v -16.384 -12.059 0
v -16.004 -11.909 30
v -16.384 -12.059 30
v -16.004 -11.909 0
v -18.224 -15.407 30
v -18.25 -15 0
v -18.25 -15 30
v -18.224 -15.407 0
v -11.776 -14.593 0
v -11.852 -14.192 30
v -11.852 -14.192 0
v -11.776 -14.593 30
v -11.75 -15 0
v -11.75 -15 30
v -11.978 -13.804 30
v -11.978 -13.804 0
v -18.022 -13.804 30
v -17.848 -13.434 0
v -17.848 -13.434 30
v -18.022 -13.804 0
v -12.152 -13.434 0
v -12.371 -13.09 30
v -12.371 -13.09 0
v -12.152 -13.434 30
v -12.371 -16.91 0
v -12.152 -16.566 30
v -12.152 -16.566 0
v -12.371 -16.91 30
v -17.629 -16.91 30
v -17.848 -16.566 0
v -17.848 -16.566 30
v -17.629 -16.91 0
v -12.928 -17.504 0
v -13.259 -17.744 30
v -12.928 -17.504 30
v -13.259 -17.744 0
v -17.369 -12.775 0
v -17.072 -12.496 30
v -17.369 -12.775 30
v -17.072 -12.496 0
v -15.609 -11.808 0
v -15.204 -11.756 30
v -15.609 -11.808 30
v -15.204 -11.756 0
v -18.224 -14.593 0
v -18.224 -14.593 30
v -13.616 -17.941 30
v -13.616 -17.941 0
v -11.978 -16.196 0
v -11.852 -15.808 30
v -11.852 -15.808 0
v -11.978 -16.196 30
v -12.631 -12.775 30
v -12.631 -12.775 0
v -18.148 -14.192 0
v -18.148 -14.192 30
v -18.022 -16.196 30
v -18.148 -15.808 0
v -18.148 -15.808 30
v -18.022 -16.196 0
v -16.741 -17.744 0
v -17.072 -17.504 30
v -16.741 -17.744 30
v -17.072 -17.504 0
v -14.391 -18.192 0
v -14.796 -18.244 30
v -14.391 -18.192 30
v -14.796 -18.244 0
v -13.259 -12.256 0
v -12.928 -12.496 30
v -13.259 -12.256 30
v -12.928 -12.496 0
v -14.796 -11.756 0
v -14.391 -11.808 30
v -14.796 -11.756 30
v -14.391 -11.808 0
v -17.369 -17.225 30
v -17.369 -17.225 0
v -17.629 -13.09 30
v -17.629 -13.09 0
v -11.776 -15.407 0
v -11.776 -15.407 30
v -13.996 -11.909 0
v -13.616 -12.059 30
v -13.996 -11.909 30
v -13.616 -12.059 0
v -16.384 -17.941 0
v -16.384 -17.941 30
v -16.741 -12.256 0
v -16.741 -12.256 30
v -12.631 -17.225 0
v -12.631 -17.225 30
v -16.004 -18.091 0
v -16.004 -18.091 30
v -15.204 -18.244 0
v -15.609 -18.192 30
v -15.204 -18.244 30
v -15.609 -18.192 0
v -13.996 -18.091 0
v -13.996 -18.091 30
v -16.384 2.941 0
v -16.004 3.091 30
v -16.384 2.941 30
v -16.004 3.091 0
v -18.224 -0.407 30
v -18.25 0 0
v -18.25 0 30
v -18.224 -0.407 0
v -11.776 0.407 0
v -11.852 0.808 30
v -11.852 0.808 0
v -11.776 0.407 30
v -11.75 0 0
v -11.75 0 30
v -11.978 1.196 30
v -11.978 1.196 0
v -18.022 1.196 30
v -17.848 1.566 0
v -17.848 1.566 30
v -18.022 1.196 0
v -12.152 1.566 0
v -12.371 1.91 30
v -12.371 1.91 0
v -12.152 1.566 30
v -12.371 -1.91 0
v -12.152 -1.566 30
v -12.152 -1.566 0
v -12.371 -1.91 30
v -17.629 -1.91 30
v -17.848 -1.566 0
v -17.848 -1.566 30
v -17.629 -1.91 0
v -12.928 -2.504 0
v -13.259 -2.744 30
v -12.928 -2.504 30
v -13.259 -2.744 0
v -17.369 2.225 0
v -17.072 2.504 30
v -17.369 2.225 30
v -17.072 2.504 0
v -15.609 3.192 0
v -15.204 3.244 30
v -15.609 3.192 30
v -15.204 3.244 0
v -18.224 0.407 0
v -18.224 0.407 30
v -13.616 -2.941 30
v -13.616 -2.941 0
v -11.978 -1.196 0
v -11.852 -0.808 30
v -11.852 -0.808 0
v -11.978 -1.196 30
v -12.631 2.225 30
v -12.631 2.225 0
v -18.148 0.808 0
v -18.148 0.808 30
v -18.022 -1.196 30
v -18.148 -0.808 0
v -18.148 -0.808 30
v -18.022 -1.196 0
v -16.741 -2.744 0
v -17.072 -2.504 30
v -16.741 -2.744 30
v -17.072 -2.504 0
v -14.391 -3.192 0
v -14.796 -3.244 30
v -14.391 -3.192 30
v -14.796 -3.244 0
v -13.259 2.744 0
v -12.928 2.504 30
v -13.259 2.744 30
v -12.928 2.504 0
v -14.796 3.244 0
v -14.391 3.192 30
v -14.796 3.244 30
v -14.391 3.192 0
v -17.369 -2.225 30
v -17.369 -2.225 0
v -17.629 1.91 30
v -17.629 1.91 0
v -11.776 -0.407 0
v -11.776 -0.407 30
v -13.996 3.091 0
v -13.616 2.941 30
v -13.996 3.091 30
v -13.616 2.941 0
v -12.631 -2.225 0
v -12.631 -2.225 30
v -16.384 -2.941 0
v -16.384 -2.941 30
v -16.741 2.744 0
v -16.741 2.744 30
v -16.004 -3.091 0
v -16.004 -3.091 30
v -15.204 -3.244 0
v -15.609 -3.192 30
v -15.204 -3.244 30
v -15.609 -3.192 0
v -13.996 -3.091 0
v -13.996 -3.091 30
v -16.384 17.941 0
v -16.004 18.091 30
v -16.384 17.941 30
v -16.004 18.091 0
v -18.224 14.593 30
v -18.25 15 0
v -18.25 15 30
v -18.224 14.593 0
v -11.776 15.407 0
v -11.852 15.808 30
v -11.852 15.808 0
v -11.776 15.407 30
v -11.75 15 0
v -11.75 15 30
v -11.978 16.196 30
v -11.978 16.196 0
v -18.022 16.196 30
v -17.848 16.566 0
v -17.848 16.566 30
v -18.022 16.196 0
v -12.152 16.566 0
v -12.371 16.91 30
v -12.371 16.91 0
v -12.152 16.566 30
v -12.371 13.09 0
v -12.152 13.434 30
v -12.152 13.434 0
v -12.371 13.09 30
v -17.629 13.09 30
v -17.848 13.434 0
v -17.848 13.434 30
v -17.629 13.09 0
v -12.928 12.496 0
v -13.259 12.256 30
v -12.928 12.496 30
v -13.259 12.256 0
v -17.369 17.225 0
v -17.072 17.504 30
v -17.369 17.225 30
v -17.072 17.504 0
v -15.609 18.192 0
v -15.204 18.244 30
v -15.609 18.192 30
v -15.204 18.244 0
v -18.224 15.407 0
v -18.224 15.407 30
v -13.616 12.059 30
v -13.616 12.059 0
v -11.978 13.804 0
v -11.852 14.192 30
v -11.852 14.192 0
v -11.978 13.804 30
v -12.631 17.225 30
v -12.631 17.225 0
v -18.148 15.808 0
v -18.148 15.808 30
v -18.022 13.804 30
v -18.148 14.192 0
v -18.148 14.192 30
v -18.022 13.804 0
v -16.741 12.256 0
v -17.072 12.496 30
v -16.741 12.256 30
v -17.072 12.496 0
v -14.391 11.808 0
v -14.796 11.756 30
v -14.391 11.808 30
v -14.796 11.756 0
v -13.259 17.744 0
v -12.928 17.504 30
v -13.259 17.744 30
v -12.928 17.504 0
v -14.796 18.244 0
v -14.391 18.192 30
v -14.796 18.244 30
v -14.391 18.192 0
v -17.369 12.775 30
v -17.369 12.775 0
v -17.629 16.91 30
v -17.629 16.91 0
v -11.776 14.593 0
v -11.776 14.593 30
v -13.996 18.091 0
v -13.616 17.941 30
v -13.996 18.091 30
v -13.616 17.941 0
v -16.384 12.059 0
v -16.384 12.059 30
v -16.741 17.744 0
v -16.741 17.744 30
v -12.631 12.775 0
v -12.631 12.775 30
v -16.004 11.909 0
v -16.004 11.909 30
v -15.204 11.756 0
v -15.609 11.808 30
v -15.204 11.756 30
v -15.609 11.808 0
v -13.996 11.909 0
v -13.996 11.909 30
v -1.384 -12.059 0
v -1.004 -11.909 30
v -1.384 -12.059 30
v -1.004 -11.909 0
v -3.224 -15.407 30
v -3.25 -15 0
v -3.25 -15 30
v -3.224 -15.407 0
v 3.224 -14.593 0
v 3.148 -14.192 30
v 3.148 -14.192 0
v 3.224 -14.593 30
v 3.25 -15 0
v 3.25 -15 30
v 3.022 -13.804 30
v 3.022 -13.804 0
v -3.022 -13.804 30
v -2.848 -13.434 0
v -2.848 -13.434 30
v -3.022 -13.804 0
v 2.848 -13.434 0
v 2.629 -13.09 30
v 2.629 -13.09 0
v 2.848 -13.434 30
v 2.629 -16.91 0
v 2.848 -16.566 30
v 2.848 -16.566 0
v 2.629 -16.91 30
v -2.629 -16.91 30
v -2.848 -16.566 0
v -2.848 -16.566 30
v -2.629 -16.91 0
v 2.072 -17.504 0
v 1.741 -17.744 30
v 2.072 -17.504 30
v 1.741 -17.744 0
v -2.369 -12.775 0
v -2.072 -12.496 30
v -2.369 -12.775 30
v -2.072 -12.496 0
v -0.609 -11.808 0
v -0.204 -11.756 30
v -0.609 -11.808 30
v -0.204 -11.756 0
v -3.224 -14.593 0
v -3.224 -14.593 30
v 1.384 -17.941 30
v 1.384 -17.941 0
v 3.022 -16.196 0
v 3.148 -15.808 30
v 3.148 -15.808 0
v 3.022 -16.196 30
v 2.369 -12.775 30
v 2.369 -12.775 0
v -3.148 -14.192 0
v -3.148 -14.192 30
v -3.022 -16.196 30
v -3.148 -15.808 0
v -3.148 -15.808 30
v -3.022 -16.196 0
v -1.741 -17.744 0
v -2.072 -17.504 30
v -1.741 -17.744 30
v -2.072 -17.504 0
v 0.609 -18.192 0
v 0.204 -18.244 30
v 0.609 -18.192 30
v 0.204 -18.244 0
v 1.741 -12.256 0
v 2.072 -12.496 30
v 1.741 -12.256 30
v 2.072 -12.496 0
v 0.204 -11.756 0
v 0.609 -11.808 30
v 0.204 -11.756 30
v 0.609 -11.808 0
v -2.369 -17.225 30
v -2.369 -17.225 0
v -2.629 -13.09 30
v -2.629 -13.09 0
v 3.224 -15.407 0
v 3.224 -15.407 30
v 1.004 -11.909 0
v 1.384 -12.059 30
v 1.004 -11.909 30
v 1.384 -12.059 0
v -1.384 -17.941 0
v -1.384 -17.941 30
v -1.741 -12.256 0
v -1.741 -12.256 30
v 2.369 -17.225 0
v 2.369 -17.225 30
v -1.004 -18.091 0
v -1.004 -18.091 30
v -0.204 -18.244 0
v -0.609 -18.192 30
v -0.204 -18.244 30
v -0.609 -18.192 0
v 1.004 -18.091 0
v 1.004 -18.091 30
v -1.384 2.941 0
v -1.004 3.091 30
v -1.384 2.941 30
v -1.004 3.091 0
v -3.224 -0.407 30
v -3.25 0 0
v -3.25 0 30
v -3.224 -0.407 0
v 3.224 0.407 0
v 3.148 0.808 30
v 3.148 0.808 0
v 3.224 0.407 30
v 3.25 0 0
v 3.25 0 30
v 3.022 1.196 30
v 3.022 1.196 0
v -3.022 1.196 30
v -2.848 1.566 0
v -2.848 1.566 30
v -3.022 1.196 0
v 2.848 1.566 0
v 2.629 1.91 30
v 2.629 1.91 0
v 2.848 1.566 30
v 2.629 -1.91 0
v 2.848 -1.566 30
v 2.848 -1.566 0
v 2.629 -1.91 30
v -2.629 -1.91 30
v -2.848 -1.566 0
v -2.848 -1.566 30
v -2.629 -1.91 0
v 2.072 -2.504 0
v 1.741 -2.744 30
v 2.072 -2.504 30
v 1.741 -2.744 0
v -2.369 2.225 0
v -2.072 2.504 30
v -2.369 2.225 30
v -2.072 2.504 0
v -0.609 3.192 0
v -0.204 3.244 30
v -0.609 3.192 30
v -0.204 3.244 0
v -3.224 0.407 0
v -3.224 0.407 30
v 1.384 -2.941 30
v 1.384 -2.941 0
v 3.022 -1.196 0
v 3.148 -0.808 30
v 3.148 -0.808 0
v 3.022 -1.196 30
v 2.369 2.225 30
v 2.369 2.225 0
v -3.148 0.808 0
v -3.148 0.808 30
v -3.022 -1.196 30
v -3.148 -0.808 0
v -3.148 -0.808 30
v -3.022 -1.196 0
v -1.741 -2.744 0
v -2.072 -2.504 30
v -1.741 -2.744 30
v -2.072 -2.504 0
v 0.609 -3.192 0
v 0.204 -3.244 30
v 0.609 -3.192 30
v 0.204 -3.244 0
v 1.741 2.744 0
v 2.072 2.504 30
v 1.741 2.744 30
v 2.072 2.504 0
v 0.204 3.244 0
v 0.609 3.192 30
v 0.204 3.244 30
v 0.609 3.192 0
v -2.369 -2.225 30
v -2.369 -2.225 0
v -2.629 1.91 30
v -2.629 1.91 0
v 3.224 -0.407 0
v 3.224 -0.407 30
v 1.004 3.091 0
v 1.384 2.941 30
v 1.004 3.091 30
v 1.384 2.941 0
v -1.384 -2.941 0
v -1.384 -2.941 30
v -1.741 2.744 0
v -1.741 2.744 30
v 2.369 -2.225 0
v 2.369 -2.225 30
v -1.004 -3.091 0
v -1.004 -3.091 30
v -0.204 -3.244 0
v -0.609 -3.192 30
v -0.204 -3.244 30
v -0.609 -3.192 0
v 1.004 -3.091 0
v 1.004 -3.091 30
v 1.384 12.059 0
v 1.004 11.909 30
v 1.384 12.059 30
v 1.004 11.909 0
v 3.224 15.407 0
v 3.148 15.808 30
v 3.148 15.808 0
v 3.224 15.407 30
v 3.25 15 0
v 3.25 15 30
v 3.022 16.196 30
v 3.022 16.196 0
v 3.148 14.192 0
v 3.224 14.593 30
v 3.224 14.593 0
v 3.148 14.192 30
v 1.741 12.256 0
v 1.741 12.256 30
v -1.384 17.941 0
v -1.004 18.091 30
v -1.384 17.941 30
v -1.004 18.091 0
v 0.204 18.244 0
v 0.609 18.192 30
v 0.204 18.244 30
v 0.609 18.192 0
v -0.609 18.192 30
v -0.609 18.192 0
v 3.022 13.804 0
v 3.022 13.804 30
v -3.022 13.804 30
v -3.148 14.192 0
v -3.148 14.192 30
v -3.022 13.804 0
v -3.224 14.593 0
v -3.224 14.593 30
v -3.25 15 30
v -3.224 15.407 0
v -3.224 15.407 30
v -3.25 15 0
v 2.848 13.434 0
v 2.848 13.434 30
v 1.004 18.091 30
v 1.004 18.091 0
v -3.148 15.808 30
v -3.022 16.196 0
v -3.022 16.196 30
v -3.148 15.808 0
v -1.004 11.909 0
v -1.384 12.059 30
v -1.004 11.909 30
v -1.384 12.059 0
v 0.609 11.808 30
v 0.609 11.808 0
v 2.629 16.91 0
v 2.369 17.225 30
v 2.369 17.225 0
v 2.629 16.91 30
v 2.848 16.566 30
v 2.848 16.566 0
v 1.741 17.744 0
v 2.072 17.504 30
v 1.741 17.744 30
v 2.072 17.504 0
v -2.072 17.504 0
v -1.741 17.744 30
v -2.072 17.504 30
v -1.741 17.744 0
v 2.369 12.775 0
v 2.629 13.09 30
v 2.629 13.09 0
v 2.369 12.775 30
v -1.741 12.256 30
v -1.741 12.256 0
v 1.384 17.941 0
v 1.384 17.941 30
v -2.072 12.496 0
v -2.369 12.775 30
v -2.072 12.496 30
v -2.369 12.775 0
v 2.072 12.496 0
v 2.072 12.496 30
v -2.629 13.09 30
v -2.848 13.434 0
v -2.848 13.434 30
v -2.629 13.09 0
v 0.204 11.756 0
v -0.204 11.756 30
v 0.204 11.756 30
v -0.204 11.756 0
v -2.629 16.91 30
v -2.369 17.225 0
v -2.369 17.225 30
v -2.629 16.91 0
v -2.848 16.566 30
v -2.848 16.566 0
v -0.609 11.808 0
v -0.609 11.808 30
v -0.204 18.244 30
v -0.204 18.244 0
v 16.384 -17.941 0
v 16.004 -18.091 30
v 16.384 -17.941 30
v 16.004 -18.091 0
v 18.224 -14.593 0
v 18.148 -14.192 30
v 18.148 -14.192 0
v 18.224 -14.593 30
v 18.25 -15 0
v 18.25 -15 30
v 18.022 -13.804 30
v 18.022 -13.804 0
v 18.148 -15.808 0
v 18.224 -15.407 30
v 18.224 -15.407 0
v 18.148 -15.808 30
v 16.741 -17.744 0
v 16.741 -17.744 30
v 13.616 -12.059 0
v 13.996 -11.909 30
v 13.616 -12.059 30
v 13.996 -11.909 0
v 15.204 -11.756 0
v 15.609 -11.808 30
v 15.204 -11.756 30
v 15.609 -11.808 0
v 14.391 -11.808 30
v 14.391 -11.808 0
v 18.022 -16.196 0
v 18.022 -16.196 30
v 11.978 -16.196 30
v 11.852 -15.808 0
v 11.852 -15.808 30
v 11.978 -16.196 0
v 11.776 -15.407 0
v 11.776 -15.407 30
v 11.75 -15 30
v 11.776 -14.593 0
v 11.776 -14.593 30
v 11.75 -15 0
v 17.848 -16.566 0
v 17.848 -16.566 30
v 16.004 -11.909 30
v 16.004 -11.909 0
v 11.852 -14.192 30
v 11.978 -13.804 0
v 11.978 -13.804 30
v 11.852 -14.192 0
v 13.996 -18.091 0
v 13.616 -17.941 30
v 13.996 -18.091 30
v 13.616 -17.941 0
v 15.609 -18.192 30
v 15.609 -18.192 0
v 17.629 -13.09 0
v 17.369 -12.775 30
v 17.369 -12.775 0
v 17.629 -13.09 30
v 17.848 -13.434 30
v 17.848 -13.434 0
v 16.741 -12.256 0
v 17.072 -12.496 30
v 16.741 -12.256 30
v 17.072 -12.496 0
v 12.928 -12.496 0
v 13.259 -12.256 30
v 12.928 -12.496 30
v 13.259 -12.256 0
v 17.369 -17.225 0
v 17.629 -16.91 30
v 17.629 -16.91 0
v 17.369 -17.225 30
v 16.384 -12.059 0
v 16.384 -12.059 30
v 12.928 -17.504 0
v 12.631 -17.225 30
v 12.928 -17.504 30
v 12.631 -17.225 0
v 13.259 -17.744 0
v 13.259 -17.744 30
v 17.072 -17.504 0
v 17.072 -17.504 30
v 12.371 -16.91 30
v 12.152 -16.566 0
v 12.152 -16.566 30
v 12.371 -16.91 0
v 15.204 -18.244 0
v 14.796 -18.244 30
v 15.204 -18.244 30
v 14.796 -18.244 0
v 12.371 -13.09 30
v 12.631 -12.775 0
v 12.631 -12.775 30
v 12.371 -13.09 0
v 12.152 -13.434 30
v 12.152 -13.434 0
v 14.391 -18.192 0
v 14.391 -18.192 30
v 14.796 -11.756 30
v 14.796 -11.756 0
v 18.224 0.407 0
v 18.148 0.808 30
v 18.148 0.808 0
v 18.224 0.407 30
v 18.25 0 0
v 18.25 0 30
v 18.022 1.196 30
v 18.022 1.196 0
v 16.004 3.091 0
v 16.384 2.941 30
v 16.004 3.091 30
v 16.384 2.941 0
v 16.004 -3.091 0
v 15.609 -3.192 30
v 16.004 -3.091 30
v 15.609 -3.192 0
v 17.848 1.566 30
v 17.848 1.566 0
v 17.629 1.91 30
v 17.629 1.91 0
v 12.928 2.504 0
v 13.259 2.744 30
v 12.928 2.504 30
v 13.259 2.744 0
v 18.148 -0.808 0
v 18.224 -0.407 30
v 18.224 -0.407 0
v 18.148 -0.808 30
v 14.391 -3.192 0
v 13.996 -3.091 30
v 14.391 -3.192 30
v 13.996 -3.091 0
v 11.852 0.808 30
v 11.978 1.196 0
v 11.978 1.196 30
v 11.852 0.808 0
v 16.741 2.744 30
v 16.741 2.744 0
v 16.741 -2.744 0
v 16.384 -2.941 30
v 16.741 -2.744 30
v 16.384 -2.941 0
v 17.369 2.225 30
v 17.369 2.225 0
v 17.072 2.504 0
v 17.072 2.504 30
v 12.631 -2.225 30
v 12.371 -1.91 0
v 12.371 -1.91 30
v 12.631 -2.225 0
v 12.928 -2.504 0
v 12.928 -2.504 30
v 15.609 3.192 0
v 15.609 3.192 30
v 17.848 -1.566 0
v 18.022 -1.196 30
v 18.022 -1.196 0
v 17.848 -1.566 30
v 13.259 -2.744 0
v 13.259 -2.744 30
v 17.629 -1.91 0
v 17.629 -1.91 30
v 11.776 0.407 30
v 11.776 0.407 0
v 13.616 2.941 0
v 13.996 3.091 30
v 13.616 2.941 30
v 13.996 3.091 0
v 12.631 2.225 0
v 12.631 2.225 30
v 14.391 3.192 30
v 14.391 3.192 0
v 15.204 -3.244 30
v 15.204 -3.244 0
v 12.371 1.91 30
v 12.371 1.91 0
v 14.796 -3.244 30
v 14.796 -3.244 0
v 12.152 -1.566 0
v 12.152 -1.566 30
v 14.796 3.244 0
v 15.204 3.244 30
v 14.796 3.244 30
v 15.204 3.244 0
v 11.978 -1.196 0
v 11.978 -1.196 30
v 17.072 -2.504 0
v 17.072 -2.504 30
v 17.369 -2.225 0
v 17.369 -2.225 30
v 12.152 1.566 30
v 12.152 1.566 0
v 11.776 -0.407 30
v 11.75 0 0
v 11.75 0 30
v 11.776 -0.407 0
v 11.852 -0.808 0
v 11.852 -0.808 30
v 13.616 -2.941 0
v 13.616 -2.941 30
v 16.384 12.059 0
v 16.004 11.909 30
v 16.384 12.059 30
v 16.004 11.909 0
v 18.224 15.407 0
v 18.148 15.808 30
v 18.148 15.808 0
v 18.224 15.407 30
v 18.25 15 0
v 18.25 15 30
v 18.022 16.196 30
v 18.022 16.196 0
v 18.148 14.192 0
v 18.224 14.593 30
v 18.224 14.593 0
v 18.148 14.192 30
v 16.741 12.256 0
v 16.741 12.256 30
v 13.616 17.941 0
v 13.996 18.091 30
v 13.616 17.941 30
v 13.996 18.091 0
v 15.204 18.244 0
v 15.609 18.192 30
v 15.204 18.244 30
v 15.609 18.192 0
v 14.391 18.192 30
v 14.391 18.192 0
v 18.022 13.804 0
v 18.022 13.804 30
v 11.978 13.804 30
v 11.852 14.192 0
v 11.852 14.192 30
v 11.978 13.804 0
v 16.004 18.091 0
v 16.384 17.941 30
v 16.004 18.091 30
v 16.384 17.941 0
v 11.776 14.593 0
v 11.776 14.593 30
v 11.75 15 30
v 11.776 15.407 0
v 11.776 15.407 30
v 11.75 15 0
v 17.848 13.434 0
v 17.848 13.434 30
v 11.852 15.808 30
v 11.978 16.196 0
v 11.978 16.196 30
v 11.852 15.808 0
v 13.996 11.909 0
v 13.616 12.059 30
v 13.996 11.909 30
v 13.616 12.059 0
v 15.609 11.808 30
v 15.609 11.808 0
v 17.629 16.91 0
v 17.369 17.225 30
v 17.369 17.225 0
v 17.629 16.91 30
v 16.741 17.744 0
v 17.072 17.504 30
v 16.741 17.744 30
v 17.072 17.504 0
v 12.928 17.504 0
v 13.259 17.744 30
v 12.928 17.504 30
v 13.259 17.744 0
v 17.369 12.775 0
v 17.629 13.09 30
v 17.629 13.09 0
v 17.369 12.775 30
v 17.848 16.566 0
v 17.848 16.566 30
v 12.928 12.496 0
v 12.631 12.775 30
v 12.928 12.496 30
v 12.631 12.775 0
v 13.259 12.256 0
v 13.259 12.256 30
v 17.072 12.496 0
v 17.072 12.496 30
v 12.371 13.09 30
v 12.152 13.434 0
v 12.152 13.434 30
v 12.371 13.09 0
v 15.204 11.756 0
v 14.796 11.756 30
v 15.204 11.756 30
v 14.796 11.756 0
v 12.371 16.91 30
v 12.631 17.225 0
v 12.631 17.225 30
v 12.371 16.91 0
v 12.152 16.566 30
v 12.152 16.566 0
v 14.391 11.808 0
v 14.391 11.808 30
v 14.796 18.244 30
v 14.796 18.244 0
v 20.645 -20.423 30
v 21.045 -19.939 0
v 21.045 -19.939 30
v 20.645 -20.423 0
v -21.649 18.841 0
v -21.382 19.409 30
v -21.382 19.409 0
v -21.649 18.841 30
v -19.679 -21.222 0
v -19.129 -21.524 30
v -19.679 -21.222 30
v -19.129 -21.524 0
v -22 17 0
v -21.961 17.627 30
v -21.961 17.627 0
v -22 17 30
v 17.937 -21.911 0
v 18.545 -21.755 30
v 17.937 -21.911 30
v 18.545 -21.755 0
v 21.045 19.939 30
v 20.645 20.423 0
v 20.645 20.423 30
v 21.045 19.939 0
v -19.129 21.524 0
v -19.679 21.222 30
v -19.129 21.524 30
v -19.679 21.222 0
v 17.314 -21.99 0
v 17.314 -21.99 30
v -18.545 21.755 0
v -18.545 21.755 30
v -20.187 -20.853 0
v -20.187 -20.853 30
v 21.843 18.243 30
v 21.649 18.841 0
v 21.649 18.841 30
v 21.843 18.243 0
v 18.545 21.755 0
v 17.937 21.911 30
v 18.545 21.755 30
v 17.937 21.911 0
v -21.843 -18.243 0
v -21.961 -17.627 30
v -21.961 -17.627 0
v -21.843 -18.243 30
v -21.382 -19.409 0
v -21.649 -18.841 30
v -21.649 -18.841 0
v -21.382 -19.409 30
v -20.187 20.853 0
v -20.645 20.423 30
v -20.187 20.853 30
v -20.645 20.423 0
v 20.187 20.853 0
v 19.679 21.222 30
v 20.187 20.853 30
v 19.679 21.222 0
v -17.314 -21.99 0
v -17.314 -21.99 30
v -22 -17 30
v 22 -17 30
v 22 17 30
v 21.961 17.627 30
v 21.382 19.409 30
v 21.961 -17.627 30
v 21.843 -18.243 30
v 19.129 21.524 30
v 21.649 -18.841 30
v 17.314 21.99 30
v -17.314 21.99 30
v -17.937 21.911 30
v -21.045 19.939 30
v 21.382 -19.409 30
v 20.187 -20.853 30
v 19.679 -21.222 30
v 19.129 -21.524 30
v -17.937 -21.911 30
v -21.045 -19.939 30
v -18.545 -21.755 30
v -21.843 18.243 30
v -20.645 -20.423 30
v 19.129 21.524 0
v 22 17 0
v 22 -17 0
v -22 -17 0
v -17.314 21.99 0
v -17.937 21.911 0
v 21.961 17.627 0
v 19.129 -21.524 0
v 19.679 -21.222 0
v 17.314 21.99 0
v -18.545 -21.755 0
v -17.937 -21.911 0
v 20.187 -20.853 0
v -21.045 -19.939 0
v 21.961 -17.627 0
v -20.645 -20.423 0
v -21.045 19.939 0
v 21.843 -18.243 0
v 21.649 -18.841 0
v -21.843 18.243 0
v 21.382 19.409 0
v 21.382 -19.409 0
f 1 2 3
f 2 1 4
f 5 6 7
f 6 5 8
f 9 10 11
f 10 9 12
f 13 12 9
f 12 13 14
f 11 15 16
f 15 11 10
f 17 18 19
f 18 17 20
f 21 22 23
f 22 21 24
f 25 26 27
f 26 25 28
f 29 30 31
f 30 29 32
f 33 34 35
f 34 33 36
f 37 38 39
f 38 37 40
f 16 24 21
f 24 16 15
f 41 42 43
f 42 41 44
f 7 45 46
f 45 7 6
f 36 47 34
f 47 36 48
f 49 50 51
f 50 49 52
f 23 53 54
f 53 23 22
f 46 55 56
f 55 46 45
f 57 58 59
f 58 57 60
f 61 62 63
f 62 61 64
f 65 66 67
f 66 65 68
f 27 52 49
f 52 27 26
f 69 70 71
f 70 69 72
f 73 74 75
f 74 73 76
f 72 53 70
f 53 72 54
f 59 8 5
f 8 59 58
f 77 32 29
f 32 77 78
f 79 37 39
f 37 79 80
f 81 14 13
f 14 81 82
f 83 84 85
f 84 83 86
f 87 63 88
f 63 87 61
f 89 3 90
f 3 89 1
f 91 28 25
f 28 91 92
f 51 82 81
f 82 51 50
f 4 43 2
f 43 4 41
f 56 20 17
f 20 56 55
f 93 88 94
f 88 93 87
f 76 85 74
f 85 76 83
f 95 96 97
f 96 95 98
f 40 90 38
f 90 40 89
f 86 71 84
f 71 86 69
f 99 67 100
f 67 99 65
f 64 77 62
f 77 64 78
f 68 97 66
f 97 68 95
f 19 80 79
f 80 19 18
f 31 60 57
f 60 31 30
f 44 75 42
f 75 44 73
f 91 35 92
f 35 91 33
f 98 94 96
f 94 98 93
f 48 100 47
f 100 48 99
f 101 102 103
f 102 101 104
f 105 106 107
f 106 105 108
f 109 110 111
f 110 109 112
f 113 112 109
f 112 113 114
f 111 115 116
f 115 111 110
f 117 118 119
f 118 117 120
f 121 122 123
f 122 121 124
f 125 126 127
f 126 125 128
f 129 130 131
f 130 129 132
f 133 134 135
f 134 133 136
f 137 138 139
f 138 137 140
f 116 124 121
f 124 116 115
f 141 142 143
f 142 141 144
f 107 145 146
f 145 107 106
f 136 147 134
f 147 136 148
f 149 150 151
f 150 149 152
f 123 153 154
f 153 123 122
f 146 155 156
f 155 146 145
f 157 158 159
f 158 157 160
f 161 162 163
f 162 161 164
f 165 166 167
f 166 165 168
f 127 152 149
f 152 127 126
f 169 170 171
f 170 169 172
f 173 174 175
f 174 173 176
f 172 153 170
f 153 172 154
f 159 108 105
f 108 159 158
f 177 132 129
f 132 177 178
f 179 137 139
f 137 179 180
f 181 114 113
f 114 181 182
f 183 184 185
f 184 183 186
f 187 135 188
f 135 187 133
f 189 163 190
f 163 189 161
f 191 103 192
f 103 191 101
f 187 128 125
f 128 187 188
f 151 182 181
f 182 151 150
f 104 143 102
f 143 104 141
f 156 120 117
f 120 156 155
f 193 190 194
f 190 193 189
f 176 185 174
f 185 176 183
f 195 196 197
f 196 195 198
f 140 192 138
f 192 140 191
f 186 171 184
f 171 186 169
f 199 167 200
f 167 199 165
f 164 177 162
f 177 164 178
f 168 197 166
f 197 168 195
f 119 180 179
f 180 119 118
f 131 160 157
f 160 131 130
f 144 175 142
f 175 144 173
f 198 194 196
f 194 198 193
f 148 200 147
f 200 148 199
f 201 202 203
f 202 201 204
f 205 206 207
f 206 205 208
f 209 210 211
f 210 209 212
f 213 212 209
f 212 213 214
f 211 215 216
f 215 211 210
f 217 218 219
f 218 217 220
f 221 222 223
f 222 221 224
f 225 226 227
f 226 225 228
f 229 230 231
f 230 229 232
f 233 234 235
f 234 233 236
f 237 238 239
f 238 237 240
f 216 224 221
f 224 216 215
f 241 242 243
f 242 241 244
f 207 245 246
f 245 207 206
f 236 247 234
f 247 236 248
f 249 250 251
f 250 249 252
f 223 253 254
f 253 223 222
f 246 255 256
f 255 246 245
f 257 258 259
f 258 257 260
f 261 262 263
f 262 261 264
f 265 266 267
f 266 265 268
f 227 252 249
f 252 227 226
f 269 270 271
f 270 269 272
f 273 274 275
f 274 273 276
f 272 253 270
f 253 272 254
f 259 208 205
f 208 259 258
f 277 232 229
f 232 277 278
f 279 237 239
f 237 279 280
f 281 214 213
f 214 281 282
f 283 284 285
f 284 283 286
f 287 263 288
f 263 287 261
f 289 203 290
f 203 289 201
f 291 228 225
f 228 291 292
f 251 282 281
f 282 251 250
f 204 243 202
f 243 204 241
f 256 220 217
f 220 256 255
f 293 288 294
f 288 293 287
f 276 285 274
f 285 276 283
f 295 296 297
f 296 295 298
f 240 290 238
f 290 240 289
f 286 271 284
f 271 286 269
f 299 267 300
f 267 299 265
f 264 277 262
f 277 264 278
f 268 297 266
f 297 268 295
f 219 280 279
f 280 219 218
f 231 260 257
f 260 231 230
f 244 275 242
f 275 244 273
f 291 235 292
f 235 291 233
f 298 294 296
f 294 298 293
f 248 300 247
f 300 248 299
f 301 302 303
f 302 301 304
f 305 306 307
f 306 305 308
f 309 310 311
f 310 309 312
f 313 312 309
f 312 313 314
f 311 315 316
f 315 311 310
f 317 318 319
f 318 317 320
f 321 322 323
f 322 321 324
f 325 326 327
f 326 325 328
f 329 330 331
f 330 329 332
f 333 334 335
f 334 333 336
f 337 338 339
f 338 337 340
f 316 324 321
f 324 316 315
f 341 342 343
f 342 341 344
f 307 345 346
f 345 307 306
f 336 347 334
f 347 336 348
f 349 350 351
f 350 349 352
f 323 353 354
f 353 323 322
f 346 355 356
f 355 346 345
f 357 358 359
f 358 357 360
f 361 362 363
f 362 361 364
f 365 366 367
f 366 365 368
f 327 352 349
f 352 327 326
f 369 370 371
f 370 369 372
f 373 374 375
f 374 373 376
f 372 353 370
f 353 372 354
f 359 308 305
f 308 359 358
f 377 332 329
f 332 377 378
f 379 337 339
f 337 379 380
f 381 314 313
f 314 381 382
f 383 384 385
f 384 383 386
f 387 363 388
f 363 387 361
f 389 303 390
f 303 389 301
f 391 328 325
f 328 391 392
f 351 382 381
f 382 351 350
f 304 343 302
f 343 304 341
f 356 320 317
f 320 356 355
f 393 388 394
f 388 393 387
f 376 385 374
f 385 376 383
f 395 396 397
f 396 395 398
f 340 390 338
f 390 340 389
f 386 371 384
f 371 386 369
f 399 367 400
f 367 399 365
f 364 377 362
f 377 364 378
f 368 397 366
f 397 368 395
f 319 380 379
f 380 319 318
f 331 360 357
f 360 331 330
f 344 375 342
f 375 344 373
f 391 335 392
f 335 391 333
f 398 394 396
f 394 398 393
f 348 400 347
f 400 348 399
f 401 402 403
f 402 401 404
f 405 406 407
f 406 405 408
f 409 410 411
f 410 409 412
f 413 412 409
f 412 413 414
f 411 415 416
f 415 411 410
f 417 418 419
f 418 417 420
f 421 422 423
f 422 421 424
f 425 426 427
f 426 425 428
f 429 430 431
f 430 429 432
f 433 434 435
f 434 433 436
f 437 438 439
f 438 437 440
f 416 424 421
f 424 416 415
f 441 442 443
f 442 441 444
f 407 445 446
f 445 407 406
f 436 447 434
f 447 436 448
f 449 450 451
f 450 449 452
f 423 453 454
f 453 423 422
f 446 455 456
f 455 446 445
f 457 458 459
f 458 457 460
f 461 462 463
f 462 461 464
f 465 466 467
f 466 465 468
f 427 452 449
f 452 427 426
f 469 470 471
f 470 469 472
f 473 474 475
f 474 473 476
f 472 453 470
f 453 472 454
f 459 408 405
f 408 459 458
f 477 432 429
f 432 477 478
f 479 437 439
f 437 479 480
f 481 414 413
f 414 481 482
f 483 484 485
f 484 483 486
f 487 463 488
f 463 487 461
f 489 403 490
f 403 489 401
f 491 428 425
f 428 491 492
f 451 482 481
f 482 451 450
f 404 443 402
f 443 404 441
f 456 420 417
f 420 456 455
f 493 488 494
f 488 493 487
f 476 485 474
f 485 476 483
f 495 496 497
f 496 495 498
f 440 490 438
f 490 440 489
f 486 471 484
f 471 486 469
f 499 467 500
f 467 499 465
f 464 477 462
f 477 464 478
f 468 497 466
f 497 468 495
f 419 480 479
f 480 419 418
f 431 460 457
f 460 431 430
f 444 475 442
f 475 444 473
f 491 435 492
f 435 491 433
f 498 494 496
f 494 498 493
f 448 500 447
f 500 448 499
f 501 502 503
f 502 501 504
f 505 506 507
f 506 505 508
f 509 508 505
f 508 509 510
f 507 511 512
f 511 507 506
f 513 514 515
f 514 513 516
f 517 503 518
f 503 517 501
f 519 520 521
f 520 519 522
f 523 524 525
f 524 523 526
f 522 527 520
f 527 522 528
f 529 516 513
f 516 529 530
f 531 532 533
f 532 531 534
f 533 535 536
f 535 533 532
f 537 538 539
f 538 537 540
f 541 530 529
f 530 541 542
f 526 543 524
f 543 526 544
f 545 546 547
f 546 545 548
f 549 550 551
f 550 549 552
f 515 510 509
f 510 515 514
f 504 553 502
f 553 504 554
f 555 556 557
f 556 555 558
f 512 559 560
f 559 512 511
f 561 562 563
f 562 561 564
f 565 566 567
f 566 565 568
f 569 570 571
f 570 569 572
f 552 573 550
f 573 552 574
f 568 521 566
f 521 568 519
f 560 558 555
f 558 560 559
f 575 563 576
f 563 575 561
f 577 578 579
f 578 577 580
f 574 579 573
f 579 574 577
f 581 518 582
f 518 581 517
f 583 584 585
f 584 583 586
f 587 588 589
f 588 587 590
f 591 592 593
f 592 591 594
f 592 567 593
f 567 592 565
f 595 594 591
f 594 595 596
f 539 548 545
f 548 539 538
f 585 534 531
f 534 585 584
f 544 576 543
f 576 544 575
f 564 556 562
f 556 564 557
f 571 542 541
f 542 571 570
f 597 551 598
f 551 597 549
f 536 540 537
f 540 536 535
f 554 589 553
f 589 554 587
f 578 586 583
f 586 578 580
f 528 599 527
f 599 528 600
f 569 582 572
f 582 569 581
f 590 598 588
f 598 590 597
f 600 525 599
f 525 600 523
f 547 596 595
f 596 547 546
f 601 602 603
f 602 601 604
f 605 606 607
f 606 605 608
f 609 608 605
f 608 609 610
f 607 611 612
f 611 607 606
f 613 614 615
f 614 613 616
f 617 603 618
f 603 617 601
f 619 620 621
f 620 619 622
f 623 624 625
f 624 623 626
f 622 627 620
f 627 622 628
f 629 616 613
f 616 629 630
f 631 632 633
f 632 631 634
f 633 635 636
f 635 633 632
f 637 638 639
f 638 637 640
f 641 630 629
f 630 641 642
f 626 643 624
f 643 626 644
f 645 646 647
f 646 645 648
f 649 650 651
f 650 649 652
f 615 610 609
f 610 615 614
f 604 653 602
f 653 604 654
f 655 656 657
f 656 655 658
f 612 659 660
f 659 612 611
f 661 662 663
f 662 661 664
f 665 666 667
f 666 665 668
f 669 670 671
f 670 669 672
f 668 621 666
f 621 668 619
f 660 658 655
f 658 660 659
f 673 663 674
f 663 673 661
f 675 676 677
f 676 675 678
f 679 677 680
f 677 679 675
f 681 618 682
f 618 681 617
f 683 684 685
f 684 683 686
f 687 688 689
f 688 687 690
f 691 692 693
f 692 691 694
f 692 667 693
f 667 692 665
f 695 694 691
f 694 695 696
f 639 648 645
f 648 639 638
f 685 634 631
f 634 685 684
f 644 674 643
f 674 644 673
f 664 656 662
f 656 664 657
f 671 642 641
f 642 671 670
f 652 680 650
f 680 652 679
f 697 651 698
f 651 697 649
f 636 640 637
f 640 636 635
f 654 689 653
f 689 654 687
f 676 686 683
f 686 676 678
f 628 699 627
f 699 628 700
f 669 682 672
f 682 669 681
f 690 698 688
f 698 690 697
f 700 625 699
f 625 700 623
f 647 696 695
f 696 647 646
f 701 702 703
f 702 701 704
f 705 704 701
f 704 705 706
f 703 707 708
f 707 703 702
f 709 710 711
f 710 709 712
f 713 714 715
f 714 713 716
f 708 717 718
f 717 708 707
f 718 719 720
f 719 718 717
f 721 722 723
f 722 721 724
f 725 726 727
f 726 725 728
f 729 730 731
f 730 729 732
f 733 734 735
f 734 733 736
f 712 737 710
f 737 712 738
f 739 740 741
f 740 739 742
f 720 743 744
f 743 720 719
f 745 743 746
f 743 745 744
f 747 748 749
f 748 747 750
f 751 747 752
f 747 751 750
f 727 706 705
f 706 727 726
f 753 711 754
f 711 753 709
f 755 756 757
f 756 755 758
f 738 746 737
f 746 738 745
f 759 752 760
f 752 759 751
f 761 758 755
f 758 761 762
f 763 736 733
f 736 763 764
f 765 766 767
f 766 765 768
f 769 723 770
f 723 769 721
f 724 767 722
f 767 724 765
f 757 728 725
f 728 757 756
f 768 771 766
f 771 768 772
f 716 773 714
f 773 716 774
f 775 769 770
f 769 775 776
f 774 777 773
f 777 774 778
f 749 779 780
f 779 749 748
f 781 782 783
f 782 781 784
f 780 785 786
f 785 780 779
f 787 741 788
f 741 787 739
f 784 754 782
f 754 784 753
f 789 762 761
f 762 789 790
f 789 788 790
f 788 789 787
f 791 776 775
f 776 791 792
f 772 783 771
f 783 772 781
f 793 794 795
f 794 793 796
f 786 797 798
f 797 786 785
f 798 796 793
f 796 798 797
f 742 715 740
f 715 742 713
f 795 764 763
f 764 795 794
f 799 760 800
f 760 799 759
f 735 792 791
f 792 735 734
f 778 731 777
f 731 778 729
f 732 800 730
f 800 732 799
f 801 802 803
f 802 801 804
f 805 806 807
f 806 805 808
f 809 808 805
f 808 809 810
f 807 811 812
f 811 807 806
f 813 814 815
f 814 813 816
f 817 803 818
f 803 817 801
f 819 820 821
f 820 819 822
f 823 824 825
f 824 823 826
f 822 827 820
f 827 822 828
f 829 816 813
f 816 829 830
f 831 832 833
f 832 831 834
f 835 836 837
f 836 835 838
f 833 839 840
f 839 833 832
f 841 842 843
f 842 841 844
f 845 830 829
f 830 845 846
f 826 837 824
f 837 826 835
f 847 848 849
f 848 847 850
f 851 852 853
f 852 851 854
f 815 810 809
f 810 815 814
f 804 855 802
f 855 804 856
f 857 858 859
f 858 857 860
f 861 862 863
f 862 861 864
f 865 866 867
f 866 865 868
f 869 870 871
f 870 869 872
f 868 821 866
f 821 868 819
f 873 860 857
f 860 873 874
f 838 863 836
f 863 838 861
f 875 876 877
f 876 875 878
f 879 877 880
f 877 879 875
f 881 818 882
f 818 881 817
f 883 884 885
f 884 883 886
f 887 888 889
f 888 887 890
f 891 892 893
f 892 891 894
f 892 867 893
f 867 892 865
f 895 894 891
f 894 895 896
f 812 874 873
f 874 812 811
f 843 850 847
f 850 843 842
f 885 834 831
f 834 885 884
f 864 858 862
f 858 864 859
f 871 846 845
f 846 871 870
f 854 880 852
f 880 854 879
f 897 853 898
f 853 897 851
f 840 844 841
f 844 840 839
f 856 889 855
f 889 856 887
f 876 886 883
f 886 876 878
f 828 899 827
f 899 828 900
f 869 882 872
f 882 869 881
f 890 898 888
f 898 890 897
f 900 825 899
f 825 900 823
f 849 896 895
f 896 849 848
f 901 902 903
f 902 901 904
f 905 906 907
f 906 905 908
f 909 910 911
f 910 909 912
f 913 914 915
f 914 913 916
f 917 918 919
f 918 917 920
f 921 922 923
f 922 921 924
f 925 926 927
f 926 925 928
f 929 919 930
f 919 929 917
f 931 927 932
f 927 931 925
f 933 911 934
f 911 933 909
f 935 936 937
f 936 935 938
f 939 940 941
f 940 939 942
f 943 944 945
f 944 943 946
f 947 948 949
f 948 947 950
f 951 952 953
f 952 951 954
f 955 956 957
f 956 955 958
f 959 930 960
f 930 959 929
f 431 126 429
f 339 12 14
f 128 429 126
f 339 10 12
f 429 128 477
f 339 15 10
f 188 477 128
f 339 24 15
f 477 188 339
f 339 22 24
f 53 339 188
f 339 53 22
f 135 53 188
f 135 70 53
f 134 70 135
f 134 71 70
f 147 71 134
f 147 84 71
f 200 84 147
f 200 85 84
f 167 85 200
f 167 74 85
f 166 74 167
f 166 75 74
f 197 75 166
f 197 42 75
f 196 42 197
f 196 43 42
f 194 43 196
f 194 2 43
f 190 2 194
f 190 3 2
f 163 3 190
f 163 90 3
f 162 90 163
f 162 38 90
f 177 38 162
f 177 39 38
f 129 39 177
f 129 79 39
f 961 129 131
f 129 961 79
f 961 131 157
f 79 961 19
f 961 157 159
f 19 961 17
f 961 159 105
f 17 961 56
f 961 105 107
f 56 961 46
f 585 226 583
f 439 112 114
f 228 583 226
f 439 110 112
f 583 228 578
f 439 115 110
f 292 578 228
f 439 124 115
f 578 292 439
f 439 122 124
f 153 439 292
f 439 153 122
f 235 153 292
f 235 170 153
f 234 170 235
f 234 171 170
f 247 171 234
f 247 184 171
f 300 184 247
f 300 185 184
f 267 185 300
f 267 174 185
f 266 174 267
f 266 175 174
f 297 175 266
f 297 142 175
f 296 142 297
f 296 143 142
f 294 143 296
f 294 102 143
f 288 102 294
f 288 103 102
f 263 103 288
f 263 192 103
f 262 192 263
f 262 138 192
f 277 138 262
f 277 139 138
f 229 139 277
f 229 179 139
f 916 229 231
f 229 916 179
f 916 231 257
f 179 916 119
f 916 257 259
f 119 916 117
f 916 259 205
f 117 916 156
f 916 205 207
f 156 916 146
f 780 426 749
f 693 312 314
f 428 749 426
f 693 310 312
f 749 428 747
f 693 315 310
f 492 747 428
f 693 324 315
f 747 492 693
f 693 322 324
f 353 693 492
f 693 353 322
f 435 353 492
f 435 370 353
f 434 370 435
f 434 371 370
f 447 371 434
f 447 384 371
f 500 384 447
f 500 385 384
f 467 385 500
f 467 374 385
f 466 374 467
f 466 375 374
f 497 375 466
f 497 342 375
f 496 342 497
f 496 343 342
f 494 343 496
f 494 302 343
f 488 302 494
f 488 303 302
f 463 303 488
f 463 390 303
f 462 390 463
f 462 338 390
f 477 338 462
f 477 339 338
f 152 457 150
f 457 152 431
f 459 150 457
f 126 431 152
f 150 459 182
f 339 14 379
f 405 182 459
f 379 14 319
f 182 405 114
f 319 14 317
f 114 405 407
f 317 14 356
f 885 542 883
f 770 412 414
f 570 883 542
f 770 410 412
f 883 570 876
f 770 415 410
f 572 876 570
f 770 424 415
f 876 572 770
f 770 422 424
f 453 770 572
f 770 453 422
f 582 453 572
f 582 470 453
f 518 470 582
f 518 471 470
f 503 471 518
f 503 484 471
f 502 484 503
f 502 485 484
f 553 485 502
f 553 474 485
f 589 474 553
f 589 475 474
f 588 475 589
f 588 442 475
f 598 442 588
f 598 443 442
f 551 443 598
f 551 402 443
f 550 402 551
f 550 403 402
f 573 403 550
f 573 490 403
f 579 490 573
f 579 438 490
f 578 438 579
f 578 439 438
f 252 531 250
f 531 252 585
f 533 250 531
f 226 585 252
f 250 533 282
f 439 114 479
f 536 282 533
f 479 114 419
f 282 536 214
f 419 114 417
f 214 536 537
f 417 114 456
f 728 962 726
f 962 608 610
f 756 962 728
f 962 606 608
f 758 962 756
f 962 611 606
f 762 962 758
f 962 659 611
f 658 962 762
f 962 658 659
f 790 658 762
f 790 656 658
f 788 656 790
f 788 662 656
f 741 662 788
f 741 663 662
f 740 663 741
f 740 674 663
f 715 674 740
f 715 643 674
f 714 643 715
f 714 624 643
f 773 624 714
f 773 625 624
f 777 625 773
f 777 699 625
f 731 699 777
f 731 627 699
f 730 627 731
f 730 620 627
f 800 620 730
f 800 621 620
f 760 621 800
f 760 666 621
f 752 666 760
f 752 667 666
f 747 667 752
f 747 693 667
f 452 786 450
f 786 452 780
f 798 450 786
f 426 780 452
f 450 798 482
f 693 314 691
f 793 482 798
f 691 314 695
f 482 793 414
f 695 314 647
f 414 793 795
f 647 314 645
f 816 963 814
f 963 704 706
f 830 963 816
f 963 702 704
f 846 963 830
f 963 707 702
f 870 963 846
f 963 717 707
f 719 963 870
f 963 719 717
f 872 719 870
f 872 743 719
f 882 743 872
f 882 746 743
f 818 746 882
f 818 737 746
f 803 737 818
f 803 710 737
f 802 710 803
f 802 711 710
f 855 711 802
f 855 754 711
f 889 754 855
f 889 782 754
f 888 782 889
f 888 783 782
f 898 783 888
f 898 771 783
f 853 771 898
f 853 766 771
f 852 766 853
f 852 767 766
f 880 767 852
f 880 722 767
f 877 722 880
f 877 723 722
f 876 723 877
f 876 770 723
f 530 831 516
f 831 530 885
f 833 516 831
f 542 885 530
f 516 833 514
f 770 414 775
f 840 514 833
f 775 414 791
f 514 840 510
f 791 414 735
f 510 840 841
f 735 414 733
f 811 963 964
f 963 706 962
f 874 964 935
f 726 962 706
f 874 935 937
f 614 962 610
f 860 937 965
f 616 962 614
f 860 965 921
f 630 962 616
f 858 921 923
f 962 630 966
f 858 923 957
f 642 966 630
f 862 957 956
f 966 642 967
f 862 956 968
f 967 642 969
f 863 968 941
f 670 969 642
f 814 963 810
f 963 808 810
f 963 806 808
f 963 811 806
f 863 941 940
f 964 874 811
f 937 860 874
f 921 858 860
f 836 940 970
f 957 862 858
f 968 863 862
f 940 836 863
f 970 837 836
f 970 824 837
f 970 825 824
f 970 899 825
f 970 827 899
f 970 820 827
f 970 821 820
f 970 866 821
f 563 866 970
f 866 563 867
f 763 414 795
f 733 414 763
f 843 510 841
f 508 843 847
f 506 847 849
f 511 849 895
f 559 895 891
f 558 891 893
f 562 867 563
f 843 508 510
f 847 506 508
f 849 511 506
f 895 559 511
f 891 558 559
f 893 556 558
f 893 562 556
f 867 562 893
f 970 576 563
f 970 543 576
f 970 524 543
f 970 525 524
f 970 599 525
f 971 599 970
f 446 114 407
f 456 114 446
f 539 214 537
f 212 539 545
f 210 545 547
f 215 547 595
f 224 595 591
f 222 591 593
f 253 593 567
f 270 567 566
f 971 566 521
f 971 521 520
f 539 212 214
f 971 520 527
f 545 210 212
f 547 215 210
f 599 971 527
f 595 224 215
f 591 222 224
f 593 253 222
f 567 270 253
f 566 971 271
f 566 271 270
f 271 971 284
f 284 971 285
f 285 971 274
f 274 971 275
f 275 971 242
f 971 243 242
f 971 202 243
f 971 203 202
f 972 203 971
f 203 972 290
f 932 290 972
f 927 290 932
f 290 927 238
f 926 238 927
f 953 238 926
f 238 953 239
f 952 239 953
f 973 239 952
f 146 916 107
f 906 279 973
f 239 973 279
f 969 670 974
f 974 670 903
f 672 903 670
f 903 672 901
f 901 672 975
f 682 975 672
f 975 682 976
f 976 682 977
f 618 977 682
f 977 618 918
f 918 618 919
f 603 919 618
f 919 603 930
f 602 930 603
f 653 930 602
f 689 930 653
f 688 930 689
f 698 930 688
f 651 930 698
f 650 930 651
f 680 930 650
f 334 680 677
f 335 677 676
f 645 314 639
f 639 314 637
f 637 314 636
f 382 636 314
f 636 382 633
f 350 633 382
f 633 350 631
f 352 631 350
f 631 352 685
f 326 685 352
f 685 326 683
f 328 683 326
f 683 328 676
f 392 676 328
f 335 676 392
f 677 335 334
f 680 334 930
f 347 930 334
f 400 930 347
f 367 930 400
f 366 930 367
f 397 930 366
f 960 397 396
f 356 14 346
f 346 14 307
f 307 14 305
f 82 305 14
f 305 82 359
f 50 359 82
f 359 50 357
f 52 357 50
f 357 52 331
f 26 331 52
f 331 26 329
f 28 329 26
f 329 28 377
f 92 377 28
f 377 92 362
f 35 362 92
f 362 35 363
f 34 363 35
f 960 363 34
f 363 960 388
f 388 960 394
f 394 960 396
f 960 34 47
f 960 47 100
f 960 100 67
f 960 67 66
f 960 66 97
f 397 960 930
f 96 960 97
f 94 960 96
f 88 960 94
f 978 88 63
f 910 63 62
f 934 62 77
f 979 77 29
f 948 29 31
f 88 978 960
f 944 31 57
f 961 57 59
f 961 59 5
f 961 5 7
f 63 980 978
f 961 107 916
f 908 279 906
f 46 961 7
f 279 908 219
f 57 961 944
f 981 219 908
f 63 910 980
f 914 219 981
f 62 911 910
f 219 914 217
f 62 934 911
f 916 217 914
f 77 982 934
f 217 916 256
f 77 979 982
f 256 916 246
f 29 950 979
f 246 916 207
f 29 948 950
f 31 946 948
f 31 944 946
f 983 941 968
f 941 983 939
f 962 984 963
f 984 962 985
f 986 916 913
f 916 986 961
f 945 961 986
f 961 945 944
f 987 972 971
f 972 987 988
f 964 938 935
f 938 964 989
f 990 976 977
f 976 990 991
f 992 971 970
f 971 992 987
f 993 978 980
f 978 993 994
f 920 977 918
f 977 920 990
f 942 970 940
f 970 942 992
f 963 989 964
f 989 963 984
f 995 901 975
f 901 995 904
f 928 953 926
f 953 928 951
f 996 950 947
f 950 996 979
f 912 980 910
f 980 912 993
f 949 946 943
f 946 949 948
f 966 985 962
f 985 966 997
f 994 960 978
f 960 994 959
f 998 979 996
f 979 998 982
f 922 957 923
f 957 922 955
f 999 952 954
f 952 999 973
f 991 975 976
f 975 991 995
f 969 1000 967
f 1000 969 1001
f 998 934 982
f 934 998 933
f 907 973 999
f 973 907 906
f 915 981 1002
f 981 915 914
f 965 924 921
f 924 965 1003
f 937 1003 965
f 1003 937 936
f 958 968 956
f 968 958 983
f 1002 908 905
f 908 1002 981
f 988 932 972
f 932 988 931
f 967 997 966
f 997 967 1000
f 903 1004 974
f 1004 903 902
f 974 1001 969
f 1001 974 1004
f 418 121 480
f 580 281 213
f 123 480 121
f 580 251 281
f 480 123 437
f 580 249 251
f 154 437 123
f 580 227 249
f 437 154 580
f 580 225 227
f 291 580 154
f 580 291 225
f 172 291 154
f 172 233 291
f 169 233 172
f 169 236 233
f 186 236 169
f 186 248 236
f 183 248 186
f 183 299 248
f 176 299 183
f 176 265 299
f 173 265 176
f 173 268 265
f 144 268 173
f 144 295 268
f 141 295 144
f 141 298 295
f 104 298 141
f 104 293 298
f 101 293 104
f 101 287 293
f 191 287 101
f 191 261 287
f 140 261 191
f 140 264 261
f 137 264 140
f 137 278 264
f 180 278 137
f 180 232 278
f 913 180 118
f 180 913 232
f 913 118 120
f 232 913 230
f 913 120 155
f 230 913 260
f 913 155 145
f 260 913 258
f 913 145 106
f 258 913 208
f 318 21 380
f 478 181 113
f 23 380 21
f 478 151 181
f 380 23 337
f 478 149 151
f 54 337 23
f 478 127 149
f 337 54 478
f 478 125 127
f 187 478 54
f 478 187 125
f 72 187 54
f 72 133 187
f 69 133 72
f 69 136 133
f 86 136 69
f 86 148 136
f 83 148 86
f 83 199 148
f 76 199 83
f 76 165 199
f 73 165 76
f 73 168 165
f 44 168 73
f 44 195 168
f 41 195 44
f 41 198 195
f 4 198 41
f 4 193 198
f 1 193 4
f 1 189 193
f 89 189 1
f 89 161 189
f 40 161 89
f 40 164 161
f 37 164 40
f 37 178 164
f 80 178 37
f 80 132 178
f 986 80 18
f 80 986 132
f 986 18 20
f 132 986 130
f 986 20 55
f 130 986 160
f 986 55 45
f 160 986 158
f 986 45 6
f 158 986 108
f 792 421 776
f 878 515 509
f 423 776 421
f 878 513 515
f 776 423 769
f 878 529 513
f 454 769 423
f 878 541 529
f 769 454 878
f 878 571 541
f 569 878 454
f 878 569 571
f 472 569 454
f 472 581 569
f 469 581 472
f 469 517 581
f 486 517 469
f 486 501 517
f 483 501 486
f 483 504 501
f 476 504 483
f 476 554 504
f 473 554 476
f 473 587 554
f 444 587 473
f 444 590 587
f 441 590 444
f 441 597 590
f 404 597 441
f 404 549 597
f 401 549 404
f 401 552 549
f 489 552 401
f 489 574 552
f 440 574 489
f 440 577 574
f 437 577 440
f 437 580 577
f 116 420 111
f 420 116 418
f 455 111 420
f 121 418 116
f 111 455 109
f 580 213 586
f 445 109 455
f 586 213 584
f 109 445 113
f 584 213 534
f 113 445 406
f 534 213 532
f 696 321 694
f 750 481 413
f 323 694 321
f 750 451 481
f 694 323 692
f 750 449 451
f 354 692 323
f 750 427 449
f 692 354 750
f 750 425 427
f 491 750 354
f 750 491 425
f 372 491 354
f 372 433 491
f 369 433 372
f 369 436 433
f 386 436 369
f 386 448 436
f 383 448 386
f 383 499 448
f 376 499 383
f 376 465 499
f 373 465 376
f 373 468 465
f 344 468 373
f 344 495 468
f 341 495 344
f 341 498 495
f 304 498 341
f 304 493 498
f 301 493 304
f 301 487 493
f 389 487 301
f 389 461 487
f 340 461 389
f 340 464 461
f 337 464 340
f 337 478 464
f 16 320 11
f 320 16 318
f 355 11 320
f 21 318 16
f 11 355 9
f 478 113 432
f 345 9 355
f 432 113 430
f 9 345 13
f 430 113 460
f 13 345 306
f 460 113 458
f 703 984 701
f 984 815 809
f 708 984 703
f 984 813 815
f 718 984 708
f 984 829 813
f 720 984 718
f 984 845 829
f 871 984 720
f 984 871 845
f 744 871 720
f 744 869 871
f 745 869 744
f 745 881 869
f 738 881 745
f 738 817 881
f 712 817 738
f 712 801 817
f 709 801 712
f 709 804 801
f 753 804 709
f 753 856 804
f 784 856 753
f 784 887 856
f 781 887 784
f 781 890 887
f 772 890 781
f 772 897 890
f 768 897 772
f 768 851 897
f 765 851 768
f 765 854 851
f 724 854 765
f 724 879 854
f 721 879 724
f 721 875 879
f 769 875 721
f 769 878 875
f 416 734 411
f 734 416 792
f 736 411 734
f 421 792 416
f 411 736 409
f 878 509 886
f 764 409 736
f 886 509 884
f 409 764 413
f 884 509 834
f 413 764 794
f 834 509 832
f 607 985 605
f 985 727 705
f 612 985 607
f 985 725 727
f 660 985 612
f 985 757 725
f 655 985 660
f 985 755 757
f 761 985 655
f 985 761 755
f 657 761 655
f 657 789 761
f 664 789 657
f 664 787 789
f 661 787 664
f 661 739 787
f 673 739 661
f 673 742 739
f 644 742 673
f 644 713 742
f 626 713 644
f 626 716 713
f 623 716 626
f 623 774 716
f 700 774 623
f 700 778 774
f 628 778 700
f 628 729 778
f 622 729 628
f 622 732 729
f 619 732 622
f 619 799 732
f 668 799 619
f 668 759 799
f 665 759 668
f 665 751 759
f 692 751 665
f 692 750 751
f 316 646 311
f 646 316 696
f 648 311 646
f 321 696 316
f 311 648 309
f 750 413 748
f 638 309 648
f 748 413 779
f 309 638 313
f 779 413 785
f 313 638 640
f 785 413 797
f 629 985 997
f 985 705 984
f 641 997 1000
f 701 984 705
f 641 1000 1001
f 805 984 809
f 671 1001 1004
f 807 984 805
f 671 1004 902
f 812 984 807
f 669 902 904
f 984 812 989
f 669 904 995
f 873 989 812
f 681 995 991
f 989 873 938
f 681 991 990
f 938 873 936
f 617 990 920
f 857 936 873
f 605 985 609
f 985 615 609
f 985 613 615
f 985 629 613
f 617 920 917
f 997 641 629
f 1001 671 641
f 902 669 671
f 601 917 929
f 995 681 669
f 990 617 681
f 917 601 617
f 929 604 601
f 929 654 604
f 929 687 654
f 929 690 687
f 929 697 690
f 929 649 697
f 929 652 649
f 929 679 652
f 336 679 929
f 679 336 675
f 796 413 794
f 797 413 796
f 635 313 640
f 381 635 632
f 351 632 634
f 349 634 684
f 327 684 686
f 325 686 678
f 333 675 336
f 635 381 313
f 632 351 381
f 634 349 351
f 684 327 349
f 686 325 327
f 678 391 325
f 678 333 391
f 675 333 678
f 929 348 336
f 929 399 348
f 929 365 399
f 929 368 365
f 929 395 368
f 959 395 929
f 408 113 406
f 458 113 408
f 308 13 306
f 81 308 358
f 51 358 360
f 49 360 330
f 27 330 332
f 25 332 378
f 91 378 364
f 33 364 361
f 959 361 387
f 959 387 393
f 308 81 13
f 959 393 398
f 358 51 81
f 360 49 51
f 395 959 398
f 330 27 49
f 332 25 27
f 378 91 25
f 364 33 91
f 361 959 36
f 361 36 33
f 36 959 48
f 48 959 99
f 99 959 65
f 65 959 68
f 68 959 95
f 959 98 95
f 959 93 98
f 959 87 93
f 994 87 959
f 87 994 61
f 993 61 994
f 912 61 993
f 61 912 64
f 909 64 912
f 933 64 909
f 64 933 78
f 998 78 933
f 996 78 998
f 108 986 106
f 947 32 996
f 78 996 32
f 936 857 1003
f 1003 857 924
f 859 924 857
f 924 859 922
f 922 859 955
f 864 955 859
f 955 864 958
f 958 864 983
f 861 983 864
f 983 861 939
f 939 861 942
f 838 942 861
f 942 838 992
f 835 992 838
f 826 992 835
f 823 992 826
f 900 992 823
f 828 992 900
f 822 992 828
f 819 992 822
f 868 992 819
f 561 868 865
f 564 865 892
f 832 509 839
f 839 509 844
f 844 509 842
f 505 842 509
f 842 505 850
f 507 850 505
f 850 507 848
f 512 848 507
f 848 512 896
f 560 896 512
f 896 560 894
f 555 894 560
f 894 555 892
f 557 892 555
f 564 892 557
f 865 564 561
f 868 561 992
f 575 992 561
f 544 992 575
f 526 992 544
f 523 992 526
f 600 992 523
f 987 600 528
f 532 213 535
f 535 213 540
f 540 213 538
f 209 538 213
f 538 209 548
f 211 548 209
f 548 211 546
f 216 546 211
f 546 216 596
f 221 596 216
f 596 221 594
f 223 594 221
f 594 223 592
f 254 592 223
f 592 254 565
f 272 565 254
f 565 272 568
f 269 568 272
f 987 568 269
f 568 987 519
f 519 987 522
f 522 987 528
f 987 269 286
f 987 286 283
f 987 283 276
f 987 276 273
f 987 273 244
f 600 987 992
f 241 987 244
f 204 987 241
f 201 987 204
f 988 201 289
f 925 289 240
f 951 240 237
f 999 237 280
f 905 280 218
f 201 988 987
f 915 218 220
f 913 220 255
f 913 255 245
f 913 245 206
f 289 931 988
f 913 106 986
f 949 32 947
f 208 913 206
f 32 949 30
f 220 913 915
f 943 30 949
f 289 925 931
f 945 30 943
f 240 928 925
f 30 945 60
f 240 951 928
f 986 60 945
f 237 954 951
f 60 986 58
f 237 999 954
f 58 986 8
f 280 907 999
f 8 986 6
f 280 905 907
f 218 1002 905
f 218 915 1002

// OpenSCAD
$fn = 50;


difference() {
	union() {
		hull() {
			translate(v = [-17.0000000000, 17.0000000000, 0]) {
				cylinder(h = 30, r = 5);
			}
			translate(v = [17.0000000000, 17.0000000000, 0]) {
				cylinder(h = 30, r = 5);
			}
			translate(v = [-17.0000000000, -17.0000000000, 0]) {
				cylinder(h = 30, r = 5);
			}
			translate(v = [17.0000000000, -17.0000000000, 0]) {
				cylinder(h = 30, r = 5);
			}
		}
	}
	union() {
		translate(v = [-15.0000000000, -15.0000000000, 0]) {
			translate(v = [0, 0, -100]) {
				cylinder(h = 200, r = 3.2500000000);
			}
		}
		translate(v = [-15.0000000000, 0.0000000000, 0]) {
			translate(v = [0, 0, -100]) {
				cylinder(h = 200, r = 3.2500000000);
			}
		}
		translate(v = [-15.0000000000, 15.0000000000, 0]) {
			translate(v = [0, 0, -100]) {
				cylinder(h = 200, r = 3.2500000000);
			}
		}
		translate(v = [0.0000000000, -15.0000000000, 0]) {
			translate(v = [0, 0, -100]) {
				cylinder(h = 200, r = 3.2500000000);
			}
		}
		translate(v = [0, 0, -100]) {
			cylinder(h = 200, r = 3.2500000000);
		}
		translate(v = [0.0000000000, 15.0000000000, 0]) {
			translate(v = [0, 0, -100]) {
				cylinder(h = 200, r = 3.2500000000);
			}
		}
		translate(v = [15.0000000000, -15.0000000000, 0]) {
			translate(v = [0, 0, -100]) {
				cylinder(h = 200, r = 3.2500000000);
			}
		}
		translate(v = [15.0000000000, 0.0000000000, 0]) {
			translate(v = [0, 0, -100]) {
				cylinder(h = 200, r = 3.2500000000);
			}
		}
		translate(v = [15.0000000000, 15.0000000000, 0]) {
			translate(v = [0, 0, -100]) {
				cylinder(h = 200, r = 3.2500000000);
			}
		}
	}
}
